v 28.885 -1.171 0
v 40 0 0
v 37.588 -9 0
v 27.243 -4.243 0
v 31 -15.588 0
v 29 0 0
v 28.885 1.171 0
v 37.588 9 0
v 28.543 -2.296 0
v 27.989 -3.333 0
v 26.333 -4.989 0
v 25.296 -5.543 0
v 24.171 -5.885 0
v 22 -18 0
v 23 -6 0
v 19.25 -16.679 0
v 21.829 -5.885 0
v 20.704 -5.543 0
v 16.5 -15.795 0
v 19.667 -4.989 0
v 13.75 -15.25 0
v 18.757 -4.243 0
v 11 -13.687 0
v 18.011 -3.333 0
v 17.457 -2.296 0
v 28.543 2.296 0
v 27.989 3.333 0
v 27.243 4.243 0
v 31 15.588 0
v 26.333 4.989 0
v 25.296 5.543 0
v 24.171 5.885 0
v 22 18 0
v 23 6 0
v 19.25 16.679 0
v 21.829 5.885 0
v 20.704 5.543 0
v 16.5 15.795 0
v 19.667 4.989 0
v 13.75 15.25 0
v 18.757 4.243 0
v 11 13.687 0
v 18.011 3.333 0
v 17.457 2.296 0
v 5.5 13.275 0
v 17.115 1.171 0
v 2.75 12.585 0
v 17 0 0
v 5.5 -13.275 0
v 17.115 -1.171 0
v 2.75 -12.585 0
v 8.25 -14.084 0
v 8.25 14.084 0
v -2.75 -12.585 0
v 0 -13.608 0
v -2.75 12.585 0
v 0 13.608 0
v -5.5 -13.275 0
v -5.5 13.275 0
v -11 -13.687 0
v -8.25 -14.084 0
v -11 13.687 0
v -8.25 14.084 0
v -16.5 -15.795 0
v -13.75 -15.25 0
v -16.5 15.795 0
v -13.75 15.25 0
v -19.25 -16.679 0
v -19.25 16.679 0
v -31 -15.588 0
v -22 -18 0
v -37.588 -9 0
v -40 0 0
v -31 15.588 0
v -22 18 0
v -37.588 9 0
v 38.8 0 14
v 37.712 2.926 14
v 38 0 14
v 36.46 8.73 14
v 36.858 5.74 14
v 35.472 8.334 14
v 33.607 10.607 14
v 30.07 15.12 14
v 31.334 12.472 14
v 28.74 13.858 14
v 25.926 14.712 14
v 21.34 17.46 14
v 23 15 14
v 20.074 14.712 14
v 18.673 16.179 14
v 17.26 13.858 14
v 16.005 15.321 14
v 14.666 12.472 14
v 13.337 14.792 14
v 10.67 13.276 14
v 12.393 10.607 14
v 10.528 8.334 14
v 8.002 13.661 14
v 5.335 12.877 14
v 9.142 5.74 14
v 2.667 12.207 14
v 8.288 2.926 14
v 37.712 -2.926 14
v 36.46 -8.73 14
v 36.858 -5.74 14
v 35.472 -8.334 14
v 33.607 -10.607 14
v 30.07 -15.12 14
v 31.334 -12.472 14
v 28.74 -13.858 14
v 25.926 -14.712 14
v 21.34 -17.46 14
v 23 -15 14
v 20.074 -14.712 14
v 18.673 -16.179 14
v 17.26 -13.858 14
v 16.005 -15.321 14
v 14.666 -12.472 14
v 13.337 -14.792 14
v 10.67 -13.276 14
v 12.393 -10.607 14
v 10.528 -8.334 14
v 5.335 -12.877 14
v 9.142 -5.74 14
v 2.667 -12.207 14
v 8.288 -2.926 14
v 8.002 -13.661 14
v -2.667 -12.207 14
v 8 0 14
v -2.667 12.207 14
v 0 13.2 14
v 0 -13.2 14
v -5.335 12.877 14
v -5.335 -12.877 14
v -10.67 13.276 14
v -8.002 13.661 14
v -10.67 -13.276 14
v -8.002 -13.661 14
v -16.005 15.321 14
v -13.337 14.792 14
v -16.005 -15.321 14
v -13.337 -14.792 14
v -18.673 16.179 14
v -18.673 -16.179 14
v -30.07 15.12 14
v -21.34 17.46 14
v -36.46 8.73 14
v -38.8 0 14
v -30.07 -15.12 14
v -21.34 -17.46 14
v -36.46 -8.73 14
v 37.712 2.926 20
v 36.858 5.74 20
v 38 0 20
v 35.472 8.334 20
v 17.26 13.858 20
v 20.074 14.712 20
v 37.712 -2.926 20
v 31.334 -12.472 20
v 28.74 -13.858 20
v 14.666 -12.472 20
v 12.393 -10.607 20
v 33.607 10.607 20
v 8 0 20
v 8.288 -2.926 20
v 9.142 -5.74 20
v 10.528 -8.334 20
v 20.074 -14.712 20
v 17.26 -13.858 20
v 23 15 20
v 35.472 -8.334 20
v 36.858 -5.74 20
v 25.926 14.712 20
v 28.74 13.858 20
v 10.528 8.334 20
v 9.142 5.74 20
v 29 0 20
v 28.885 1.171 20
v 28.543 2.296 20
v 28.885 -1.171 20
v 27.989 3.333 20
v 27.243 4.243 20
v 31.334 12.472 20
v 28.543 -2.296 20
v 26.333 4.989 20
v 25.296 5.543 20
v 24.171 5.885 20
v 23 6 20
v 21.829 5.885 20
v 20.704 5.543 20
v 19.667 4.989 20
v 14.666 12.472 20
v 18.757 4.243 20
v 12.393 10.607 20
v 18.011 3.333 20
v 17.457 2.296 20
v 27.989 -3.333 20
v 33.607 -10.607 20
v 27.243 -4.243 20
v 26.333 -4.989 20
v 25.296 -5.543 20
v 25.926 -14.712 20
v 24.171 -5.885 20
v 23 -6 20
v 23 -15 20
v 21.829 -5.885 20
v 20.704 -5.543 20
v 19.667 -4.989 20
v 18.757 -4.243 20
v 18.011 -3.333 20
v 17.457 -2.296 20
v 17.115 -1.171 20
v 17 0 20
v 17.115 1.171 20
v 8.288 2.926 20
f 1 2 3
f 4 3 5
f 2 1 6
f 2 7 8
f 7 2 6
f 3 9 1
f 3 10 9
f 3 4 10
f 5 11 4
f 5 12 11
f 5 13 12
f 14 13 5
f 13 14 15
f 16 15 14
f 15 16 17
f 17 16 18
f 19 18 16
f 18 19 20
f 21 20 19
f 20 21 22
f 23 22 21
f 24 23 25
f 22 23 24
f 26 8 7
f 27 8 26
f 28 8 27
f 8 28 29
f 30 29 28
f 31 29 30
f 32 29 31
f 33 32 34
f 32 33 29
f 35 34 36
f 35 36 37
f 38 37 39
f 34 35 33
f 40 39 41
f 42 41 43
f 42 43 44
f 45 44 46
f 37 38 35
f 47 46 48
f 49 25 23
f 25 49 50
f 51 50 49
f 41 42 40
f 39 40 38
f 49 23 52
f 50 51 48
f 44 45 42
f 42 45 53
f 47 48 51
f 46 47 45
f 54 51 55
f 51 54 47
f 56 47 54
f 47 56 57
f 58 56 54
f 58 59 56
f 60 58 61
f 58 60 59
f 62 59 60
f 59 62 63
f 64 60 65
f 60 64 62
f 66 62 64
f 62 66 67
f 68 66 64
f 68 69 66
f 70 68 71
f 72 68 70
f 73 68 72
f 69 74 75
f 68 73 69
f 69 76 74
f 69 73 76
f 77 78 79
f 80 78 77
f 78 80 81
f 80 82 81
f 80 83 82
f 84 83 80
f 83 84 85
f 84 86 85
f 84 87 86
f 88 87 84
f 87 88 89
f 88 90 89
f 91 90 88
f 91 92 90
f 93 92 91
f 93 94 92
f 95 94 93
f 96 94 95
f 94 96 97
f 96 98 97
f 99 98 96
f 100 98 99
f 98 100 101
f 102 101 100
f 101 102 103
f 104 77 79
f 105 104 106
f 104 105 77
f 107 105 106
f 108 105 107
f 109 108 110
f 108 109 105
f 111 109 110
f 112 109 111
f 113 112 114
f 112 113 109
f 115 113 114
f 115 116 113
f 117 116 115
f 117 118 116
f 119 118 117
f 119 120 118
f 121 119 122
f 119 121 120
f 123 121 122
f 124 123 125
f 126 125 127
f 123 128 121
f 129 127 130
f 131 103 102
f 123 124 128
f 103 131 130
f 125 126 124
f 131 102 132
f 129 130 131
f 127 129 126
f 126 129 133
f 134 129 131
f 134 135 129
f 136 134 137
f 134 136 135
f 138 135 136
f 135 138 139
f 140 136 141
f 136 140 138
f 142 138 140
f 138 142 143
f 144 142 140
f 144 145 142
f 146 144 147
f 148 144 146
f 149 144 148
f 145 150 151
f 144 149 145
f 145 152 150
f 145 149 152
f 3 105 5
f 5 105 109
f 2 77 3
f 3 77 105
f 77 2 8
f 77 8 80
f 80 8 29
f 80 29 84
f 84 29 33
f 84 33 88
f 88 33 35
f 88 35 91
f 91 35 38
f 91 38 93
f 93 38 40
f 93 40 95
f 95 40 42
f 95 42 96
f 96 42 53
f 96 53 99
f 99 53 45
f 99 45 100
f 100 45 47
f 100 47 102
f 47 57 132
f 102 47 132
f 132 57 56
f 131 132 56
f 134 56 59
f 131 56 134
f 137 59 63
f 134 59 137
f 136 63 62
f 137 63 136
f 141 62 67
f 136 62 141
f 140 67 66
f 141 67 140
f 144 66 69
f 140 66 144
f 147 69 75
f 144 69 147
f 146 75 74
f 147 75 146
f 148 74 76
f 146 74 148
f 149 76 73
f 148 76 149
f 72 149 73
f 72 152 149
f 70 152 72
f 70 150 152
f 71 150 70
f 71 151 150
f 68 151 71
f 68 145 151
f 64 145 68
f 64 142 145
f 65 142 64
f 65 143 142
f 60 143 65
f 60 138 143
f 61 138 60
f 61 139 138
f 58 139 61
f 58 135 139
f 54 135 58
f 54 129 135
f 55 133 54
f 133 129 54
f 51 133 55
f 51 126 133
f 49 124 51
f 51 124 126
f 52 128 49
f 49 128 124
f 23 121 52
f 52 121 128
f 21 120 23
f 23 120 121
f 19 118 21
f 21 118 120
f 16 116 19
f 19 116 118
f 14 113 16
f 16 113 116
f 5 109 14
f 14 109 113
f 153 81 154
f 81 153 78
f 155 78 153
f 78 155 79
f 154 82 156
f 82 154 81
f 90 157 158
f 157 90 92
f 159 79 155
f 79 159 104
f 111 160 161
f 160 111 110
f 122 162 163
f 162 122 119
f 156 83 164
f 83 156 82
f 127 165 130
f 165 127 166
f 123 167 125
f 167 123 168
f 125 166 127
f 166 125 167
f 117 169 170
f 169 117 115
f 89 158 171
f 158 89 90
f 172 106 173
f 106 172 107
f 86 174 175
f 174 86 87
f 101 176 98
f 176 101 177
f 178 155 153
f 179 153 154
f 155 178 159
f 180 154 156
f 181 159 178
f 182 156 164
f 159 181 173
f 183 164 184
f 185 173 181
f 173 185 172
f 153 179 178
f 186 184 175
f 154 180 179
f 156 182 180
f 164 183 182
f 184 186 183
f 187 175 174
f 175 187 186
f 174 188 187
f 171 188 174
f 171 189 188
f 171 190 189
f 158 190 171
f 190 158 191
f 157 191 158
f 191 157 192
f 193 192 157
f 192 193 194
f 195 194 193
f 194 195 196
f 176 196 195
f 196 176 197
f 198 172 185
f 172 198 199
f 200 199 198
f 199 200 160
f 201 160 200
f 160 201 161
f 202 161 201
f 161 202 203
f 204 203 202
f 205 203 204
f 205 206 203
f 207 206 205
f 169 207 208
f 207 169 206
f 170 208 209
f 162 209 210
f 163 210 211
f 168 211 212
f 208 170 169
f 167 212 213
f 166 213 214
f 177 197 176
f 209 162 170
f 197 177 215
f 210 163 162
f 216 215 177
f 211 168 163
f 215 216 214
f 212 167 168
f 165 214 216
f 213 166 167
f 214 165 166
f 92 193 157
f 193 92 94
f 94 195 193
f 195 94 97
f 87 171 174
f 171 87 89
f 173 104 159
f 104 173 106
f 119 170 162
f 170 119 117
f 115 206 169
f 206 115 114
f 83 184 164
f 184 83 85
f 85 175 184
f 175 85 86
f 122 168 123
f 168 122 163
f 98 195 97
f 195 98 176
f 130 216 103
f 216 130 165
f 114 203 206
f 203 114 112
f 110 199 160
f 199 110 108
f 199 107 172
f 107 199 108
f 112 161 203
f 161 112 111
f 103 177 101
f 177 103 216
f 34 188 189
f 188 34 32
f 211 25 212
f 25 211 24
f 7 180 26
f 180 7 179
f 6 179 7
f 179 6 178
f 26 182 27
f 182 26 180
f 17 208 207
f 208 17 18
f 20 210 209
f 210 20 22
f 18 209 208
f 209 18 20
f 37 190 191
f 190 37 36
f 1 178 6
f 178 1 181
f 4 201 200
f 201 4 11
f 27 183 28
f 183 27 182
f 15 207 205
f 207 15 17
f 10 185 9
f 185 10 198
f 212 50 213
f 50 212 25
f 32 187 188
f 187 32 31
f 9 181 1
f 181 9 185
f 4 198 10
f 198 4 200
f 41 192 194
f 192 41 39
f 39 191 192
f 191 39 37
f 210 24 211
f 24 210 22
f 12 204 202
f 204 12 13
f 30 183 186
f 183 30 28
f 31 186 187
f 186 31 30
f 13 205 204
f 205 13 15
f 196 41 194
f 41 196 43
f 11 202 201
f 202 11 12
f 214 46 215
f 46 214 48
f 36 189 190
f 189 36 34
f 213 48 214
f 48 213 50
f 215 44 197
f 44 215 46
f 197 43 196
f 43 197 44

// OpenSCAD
$fn = 32;

// ----------------------------------------------------------------------
// Handle: 80 x 36 mm grip, 14 mm thick
// ----------------------------------------------------------------------

// --- parameters (mm) ---
length = 80;              // grip length
width = 36;               // grip width
thickness = 14;           // grip thickness
waist = 0.72;             // width factor at the middle
draft = 0.97;             // top face scale of the extrusion
scallops = 6;             // finger rests per side
ripple = 0.05;            // depth factor of the finger rests
boss_d = 30;              // mounting boss diameter
boss_h = 6;               // mounting boss height
boss_hole_d = 12;         // screw clearance through the boss
boss_r = 23;              // boss centre from the grip centre

/* ergonomic grip outline, closed spline-like polygon in the XY plane */
grip = [[-22, 18], [-19.25, 16.679], [-16.5, 15.795], [-13.75, 15.25], [-11, 13.687], [-8.25, 14.084], [-5.5, 13.275], [-2.75, 12.585], [0, 13.608], [2.75, 12.585], [5.5, 13.275], [8.25, 14.084], [11, 13.687], [13.75, 15.25], [16.5, 15.795], [19.25, 16.679], [22, 18], [31, 15.588], [37.588, 9], [40, 0], [37.588, -9], [31, -15.588], [22, -18], [22, -18], [19.25, -16.679], [16.5, -15.795], [13.75, -15.25], [11, -13.687], [8.25, -14.084], [5.5, -13.275], [2.75, -12.585], [0, -13.608], [-2.75, -12.585], [-5.5, -13.275], [-8.25, -14.084], [-11, -13.687], [-13.75, -15.25], [-16.5, -15.795], [-19.25, -16.679], [-22, -18], [-31, -15.588], [-37.588, -9], [-40, 0], [-37.588, 9], [-31, 15.588], [-22, 18]];

module grip_body() {
  linear_extrude(height = thickness, scale = draft) polygon(grip);
}

module boss_body() {
  /* sunk 1 mm into the grip so the joint overlaps */
  translate([boss_r, 0, thickness - 1]) cylinder(h = boss_h + 1, d = boss_d);
}

difference() {
  union() {
    grip_body();
    boss_body();
  }
  translate([boss_r, 0, -1]) cylinder(h = thickness + boss_h + 2, d = boss_hole_d);
}
